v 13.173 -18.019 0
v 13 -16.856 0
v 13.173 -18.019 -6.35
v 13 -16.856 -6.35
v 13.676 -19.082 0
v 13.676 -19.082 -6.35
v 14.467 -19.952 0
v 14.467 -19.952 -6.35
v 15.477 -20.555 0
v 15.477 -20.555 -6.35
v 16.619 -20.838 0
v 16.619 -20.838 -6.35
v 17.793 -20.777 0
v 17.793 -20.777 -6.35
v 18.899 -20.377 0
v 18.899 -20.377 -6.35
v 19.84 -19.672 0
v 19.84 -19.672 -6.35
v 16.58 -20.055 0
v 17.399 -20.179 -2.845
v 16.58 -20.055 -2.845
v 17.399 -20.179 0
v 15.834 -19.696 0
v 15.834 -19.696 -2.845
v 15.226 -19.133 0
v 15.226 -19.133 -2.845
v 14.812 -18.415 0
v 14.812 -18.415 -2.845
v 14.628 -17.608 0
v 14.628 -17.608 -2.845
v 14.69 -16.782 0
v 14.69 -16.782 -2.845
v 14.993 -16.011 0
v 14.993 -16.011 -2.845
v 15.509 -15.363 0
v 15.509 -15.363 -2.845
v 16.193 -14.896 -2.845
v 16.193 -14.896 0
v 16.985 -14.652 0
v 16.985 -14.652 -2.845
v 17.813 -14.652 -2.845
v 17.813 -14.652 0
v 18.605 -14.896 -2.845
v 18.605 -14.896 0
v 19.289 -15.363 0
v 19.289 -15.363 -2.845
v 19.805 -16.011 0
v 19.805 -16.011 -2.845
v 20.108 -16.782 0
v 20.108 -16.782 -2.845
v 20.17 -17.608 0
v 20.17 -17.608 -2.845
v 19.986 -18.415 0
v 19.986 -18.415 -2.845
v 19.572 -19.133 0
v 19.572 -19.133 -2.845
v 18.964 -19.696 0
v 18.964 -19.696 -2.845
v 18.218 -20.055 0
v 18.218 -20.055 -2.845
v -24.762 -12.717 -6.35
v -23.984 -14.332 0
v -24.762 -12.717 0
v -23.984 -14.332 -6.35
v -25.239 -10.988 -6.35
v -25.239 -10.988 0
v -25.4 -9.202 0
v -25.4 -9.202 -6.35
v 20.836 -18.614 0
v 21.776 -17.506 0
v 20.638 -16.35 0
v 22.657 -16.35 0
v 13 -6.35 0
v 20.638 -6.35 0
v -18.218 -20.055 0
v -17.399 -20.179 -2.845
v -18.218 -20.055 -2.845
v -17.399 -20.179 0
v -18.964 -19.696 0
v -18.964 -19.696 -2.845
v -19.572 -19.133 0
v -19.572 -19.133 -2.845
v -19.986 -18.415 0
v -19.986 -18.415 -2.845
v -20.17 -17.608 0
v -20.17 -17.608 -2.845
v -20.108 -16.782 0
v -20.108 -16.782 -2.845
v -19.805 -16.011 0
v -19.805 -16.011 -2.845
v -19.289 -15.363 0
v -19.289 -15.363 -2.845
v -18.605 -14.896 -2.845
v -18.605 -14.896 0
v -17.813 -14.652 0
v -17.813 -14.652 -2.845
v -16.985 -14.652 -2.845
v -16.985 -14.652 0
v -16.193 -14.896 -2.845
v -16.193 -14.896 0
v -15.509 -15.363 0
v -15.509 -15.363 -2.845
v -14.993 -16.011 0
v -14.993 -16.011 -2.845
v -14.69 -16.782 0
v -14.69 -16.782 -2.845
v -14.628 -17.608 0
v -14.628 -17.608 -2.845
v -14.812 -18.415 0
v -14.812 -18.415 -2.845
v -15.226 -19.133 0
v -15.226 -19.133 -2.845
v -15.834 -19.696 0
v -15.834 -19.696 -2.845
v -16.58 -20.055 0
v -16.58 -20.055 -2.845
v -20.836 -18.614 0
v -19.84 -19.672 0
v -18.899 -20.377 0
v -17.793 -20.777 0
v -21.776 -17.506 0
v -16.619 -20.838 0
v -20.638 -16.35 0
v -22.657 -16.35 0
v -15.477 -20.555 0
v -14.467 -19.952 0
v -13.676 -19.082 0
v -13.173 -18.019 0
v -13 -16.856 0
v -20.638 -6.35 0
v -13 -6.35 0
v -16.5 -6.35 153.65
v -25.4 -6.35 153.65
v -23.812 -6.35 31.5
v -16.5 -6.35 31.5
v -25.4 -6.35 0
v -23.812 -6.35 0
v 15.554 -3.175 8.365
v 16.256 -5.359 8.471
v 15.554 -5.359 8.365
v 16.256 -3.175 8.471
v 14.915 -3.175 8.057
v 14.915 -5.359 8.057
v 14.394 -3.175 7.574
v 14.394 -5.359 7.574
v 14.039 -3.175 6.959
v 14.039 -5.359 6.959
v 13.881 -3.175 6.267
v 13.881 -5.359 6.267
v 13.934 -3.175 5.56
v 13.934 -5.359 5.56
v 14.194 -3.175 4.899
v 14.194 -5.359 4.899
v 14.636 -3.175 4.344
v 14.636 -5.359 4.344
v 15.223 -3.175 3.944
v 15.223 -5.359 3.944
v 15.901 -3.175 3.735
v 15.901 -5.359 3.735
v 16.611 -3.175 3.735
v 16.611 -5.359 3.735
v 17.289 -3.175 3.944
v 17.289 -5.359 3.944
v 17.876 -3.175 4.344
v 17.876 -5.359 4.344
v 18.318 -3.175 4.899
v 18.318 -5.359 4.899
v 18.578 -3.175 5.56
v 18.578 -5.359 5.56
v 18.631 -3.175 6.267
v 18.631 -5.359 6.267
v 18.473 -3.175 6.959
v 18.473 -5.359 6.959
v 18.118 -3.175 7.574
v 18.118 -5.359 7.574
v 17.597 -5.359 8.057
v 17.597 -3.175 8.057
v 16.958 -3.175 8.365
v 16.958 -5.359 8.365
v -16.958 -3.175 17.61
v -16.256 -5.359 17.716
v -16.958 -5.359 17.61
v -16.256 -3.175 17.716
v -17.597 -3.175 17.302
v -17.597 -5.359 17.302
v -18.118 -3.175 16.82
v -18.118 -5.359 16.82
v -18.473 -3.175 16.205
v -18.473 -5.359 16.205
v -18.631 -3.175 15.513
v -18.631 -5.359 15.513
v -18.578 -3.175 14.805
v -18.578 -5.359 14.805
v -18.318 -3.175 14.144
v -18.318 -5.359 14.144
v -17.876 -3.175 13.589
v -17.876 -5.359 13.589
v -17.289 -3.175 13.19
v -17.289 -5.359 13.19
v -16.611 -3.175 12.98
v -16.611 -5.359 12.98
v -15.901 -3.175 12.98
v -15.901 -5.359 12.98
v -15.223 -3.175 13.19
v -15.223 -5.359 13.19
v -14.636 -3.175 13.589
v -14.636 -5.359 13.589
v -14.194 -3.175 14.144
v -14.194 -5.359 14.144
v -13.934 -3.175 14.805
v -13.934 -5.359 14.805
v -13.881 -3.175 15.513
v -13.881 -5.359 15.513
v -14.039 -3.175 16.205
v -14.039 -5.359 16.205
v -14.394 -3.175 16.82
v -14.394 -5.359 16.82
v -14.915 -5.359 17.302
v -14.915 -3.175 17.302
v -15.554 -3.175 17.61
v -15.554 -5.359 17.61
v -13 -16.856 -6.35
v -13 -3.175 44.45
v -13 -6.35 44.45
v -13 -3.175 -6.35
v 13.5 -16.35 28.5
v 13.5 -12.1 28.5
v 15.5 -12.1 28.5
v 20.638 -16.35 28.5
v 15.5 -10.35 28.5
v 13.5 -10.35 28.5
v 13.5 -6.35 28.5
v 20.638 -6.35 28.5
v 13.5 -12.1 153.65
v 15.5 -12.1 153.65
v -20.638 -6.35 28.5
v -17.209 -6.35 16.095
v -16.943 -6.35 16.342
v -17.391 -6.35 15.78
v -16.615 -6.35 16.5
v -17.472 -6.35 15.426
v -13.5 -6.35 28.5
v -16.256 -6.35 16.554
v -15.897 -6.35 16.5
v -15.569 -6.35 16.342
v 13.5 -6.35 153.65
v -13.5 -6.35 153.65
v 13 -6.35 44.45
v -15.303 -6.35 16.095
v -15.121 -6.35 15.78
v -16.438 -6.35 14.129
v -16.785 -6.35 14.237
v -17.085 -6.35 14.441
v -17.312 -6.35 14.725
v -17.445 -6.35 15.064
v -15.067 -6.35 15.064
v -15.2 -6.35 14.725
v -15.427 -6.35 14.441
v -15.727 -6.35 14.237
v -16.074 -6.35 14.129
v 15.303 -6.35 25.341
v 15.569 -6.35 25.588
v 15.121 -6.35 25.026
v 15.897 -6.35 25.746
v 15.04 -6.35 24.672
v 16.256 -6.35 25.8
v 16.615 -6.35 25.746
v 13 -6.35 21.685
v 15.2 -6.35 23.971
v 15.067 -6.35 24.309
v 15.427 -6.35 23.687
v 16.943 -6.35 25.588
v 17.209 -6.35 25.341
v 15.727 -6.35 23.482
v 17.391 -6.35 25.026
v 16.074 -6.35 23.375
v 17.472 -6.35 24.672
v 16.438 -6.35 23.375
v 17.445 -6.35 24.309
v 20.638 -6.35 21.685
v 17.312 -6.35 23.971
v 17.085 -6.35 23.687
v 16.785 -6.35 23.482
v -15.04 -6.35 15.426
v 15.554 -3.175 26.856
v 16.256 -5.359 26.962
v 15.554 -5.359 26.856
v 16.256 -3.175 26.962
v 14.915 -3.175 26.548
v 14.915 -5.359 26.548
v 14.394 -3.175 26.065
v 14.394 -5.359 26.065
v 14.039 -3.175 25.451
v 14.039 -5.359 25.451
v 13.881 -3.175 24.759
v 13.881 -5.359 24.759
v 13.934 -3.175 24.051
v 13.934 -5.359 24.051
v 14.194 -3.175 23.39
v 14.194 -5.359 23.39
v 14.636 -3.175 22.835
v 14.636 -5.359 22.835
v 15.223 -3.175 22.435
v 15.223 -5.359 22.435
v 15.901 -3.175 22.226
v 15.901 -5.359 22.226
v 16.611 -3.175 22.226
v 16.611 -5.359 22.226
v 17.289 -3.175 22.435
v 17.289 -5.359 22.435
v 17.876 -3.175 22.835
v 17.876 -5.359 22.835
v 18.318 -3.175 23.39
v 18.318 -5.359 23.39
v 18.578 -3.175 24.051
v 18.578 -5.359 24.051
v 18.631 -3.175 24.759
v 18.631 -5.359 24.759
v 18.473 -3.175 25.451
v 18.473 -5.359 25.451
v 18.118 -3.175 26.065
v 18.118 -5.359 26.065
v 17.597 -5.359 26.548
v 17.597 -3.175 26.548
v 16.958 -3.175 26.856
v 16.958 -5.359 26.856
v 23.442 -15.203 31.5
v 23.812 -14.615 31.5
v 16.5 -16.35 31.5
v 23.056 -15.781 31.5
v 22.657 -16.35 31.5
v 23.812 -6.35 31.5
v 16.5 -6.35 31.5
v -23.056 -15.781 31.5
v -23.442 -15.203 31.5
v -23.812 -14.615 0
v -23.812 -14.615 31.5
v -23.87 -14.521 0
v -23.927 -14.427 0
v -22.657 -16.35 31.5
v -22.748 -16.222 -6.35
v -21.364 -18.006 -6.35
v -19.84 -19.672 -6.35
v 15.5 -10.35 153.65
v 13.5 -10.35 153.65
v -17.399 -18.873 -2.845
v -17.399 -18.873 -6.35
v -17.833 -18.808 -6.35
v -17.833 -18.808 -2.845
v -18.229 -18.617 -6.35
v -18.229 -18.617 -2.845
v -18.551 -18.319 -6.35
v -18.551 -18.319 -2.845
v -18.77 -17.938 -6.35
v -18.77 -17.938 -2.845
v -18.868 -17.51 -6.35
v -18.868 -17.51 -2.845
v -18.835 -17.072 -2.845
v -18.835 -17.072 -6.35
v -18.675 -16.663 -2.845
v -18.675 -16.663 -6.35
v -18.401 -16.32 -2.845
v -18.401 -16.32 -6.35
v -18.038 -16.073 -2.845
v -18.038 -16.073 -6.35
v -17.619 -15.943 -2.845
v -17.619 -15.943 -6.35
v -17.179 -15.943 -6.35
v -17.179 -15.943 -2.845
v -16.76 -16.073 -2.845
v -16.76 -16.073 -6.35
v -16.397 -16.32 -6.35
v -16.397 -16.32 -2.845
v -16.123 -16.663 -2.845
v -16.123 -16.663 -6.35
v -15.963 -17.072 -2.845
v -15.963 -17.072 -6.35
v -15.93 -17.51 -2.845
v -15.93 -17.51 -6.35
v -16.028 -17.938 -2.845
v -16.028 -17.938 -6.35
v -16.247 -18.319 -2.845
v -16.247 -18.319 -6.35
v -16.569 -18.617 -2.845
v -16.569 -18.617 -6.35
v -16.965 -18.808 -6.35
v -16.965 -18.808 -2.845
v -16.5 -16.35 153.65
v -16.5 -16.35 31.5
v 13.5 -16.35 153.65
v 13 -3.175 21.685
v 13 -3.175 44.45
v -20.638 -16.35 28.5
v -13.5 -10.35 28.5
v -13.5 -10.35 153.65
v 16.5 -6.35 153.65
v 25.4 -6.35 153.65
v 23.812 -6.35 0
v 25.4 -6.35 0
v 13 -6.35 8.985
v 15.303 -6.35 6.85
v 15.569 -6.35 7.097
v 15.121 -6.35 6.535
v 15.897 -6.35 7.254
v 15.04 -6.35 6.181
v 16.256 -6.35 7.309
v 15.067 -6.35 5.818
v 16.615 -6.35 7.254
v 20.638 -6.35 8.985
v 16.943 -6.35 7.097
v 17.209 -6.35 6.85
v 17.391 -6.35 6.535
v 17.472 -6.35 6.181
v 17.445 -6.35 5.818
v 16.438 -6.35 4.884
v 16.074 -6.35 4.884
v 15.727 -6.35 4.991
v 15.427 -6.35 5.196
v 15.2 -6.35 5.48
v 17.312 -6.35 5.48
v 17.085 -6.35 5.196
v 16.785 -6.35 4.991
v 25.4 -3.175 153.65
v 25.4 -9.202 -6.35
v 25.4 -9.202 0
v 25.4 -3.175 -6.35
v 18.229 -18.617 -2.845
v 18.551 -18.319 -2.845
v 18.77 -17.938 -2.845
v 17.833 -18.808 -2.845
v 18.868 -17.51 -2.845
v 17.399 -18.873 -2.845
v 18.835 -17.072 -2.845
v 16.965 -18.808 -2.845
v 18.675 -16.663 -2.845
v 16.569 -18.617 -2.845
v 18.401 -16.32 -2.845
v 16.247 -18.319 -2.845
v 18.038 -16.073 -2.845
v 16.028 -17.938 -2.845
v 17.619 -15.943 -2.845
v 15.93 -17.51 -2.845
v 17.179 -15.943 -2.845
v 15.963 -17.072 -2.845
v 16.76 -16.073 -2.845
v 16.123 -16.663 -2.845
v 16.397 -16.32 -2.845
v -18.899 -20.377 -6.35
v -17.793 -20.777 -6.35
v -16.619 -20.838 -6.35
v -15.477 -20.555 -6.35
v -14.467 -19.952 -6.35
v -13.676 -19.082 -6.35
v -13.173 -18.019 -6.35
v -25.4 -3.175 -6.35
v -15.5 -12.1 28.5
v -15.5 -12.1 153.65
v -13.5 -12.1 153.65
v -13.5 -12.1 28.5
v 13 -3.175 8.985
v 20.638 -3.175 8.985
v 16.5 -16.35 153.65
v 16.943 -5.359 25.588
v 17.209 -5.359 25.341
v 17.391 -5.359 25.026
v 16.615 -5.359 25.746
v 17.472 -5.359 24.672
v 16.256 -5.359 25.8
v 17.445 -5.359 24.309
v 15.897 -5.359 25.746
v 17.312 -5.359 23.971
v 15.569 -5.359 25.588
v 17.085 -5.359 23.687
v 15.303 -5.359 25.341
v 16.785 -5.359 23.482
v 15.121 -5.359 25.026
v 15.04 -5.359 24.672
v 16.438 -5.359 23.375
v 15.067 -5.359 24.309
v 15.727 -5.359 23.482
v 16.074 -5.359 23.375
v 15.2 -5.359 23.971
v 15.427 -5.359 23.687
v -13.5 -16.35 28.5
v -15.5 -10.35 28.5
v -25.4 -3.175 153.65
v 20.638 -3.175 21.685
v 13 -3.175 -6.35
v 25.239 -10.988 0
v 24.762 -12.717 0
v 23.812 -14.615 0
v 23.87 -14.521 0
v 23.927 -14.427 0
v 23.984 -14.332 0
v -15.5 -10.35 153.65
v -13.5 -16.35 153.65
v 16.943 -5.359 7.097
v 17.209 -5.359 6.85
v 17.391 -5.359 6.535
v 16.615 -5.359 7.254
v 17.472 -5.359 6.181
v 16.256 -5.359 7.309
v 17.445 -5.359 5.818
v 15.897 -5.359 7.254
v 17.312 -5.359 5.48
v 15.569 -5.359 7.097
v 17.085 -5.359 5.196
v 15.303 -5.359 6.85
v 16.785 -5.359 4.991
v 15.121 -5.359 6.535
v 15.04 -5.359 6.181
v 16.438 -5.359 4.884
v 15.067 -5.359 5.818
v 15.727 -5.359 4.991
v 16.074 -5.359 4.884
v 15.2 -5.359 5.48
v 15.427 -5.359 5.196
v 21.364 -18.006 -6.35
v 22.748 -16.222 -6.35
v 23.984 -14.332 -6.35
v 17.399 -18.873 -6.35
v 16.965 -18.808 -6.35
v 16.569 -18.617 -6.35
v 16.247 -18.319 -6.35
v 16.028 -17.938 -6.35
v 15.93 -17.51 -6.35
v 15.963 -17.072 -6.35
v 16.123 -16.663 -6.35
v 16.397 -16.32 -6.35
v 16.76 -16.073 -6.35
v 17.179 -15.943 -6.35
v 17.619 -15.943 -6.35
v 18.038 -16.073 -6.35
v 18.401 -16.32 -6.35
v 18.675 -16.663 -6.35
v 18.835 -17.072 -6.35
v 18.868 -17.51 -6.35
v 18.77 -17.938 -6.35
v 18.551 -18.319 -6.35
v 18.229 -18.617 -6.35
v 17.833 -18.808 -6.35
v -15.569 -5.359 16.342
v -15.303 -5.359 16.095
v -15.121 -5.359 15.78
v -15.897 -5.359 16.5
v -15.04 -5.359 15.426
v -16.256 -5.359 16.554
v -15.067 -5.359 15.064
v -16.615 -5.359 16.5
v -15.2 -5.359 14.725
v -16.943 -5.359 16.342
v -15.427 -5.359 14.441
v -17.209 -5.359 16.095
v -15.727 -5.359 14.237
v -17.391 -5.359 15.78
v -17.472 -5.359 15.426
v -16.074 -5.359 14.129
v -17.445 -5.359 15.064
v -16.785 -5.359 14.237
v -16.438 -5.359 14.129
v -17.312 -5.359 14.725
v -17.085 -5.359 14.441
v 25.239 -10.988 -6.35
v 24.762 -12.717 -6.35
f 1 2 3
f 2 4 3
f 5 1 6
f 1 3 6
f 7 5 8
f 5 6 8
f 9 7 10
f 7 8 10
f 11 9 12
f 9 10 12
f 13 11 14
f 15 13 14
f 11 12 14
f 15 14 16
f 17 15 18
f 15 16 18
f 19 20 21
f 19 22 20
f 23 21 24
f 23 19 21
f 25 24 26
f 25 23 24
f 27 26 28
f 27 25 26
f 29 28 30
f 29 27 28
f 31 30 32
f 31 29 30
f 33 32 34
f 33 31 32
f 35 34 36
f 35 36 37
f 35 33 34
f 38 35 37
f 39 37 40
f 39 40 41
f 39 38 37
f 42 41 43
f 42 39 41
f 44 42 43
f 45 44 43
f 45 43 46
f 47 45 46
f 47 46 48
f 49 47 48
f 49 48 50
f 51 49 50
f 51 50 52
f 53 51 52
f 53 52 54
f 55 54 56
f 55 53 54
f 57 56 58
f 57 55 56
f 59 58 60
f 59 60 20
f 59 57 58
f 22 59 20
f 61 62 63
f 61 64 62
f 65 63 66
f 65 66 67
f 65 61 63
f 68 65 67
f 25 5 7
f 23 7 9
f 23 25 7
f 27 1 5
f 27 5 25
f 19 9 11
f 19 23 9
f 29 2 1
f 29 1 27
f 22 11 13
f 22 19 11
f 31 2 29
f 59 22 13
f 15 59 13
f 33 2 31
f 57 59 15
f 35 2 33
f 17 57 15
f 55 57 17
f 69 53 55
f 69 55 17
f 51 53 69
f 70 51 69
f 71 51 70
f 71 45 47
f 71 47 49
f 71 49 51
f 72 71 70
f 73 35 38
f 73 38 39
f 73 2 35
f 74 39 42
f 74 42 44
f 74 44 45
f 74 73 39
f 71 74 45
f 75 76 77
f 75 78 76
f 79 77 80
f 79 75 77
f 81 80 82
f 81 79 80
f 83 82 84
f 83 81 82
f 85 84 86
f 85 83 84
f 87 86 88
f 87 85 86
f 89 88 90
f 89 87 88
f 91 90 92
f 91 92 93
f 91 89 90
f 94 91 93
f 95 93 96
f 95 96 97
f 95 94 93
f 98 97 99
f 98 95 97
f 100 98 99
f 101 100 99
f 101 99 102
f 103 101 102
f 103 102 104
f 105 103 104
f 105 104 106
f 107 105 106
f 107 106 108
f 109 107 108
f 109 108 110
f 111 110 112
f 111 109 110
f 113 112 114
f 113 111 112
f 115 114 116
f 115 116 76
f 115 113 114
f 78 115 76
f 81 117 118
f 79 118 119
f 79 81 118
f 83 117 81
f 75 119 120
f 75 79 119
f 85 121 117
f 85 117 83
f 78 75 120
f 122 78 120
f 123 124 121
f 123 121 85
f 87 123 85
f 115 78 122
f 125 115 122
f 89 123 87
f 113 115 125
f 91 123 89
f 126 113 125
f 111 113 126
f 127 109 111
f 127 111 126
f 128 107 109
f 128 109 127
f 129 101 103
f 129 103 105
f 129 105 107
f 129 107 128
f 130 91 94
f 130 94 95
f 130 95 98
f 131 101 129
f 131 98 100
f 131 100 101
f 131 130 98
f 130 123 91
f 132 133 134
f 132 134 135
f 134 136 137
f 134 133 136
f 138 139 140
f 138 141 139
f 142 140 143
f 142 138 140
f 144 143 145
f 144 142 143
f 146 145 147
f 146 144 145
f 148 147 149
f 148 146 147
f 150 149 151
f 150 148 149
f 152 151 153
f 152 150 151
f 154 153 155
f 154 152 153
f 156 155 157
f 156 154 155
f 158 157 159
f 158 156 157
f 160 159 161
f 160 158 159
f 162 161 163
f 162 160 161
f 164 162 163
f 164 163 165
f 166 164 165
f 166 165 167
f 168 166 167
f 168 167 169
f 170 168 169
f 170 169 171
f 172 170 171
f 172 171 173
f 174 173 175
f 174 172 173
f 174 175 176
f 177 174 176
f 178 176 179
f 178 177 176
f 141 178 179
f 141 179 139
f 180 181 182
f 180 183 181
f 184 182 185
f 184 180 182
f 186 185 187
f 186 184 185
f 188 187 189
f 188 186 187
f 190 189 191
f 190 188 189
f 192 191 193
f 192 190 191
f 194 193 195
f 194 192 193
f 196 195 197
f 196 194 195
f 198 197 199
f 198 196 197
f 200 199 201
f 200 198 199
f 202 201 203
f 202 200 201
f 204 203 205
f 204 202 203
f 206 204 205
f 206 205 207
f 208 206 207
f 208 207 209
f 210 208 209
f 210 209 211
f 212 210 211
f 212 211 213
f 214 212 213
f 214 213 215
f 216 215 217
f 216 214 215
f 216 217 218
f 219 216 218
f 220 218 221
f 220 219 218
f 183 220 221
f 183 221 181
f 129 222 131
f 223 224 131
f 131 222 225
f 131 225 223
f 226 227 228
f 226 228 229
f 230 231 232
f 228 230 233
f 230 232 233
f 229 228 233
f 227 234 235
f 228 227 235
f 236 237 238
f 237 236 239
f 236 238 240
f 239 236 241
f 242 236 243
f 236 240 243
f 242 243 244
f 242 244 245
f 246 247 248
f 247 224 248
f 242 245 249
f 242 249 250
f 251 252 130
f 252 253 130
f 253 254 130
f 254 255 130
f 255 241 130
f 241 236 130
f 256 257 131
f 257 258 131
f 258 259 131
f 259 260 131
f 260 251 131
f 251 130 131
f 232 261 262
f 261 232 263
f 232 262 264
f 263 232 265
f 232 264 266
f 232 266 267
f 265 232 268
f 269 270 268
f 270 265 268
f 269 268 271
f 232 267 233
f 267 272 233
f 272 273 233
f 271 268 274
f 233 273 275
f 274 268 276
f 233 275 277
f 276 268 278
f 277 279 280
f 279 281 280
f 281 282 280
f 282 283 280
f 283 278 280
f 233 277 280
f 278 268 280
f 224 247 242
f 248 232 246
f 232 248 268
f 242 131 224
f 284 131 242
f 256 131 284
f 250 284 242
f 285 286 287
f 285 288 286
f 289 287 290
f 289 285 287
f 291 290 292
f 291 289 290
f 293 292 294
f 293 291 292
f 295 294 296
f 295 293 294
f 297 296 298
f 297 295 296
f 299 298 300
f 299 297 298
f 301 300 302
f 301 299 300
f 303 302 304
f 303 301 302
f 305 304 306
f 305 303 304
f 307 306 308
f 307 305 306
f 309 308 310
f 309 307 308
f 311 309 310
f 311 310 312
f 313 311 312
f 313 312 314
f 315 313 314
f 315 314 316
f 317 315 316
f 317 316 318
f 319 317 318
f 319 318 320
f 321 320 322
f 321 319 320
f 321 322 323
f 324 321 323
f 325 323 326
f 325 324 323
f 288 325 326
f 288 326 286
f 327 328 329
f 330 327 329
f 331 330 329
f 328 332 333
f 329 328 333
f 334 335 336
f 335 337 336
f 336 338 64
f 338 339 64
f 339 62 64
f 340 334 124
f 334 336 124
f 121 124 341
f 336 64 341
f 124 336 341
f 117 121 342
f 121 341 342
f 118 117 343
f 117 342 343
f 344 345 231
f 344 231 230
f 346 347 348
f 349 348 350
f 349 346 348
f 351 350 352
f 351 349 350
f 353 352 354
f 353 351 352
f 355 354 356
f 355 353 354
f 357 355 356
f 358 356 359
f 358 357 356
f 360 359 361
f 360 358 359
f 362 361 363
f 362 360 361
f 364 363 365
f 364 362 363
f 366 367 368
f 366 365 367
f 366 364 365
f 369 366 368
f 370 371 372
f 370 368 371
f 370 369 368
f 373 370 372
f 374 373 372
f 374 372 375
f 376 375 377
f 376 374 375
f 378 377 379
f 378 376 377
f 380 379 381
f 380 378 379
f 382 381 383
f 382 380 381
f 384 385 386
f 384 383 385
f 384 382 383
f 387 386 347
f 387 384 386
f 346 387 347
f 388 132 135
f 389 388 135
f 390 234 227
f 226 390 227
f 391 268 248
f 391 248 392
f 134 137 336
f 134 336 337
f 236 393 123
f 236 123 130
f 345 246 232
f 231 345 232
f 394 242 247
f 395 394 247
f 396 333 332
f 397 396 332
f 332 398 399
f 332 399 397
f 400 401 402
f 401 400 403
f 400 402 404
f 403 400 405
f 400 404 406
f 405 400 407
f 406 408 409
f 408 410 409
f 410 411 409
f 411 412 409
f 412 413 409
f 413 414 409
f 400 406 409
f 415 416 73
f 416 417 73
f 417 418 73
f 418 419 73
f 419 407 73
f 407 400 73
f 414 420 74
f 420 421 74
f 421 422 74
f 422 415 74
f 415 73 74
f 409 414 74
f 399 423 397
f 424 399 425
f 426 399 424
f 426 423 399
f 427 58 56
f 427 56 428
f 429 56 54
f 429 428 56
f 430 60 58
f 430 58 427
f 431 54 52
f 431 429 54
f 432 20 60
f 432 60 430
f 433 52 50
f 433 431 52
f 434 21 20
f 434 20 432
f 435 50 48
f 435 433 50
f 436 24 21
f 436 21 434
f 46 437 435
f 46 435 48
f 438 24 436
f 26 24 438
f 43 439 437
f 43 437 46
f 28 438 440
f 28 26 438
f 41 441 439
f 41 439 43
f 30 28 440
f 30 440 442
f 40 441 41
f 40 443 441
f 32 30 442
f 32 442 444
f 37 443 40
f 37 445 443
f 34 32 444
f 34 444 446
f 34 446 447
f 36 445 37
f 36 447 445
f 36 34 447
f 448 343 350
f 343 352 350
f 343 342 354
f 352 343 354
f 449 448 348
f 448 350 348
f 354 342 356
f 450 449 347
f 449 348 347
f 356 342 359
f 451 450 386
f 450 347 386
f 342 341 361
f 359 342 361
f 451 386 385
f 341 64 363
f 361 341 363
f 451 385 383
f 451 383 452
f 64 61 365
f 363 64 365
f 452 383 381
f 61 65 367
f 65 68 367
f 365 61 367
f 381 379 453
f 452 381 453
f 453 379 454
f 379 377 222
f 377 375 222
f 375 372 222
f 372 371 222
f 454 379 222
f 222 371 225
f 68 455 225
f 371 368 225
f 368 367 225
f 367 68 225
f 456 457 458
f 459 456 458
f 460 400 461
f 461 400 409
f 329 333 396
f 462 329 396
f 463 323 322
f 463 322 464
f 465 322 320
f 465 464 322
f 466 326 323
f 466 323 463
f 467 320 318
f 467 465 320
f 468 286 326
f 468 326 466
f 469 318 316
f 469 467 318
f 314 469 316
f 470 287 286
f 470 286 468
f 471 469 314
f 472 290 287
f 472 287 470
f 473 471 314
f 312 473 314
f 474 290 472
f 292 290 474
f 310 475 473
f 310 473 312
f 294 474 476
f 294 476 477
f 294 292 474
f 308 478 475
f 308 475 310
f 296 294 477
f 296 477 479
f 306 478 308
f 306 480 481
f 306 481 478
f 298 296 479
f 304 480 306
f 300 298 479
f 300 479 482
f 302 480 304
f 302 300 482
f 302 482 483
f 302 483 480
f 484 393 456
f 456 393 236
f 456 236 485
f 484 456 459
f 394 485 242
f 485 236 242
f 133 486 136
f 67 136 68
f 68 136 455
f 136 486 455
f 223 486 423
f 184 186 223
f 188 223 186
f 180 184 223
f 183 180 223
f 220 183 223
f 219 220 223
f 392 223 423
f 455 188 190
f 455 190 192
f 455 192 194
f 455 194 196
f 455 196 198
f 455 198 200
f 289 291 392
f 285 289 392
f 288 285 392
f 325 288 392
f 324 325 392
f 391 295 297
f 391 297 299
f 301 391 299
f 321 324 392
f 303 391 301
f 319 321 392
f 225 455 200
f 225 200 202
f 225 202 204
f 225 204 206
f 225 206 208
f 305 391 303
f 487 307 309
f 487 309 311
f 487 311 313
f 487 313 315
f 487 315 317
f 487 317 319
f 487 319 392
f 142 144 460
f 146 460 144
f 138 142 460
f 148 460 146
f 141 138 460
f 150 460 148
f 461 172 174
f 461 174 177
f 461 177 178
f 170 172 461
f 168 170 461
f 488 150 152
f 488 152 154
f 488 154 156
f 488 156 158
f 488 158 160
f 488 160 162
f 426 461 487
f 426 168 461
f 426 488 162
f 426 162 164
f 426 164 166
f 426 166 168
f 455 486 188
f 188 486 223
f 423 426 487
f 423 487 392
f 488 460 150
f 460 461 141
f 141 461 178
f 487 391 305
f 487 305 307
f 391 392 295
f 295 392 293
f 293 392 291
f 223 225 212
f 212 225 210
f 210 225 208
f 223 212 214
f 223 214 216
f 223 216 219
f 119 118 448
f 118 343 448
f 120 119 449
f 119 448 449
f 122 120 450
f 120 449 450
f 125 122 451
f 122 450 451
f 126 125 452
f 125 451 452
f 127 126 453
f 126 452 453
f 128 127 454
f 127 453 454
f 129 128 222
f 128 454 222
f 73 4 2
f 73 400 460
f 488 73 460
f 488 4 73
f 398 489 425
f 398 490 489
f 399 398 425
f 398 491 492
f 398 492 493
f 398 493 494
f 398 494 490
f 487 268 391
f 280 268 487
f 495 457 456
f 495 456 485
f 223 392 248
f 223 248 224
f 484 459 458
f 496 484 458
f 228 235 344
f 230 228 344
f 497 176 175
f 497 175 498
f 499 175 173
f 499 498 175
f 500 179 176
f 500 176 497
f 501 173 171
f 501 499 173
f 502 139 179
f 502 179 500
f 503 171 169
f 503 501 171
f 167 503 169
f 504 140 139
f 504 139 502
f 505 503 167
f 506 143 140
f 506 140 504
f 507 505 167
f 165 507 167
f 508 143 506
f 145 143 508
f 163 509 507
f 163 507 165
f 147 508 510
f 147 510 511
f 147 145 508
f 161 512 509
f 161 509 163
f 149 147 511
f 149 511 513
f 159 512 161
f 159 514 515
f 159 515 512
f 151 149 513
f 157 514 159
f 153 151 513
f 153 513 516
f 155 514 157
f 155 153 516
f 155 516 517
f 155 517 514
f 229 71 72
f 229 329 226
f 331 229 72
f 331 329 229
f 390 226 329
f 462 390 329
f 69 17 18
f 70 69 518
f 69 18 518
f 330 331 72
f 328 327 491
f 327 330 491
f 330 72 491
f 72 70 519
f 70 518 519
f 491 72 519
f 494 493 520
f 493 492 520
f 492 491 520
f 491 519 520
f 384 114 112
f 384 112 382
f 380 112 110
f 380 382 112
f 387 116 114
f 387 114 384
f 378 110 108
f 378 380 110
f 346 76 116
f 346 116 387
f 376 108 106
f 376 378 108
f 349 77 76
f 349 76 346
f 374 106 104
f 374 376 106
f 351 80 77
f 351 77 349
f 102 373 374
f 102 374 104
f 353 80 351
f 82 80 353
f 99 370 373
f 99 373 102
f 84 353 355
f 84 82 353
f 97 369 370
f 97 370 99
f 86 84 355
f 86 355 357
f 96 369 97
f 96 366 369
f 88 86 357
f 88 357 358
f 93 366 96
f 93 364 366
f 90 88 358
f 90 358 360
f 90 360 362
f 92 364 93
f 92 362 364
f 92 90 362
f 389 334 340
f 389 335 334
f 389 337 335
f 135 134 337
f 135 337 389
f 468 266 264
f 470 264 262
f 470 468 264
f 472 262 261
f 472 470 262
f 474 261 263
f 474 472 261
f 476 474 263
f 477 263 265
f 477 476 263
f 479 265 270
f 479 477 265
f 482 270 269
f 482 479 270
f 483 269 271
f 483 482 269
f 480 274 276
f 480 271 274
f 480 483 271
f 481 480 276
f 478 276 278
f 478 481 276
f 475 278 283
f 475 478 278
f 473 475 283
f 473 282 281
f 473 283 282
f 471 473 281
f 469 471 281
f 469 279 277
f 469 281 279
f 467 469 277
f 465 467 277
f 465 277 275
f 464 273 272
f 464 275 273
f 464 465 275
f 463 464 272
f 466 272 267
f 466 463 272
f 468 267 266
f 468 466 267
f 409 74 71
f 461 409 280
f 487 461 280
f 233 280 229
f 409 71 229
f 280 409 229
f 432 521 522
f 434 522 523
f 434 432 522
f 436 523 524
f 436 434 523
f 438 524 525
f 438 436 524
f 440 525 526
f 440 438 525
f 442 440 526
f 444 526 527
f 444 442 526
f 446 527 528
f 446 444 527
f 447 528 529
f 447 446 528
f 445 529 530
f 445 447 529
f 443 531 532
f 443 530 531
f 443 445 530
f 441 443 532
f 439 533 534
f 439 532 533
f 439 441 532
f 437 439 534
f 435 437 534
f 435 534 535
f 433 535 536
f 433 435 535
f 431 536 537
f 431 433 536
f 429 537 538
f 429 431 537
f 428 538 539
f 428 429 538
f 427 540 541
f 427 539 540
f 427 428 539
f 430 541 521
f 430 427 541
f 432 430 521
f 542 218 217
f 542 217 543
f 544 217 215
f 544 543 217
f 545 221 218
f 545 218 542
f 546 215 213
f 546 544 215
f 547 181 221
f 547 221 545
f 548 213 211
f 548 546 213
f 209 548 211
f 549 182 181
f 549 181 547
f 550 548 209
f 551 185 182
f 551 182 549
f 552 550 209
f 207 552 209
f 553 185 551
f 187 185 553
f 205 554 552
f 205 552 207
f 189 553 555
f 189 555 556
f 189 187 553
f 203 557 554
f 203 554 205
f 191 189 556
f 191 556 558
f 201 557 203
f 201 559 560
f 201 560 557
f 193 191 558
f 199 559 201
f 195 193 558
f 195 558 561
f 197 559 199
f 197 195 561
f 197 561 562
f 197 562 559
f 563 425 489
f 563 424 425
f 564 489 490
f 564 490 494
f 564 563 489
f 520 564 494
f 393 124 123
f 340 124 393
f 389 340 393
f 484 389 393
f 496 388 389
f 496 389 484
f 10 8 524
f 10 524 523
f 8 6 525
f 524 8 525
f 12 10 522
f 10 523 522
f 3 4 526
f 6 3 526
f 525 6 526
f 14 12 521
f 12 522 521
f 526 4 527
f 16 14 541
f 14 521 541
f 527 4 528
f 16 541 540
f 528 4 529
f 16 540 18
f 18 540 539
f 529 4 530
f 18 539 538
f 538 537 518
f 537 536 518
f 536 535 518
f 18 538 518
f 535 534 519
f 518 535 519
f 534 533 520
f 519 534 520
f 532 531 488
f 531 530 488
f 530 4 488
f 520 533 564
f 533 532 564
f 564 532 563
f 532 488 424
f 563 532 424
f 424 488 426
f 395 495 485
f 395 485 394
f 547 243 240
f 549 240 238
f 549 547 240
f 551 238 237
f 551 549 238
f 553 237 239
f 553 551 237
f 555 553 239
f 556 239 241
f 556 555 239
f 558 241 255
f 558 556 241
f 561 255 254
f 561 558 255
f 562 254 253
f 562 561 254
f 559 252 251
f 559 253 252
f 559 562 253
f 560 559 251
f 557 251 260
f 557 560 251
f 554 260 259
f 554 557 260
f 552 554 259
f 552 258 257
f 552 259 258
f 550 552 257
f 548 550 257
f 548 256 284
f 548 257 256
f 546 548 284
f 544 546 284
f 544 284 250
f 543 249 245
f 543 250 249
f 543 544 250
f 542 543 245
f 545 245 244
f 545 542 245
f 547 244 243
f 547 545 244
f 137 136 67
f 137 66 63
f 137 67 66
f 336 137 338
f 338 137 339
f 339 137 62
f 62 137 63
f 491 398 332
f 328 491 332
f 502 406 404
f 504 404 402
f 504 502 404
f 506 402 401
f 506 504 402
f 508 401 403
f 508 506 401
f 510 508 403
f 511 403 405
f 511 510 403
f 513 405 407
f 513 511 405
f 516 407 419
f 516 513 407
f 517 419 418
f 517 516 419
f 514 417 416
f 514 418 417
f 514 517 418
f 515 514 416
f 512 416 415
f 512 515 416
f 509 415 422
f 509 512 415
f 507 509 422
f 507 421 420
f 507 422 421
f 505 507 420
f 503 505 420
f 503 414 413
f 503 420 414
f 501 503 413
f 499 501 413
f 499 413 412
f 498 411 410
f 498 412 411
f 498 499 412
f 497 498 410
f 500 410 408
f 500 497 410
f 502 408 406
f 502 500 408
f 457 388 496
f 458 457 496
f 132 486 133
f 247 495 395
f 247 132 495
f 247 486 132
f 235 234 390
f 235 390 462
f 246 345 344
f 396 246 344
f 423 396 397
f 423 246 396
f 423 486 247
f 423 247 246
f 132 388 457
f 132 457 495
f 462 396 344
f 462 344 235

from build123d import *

# Parameters (mm, degrees)
SKETCH1_W                                     = 50.8
SKETCH1_H                                     = 25.4
BASE_FLANGE1_DEPTH                            = 6.35
SKETCH22_W                                    = 50.8
SKETCH22_H                                    = 160
BOSS_EXTRUDE1_DEPTH                           = 3.175
GUSSET1_START                                 = -22.225
GUSSET1_DEPTH                                 = 1.5875
CBORE_FOR_4_SOCKET_HEAD_CAP_SCREW1_AT_2_COUNT = 2
CBORE_FOR_4_SOCKET_HEAD_CAP_SCREW1_AT_2_PITCH = 34.798
SKETCH12_W                                    = 26
SKETCH12_H                                    = 28.575
CUT_EXTRUDE1_DEPTH                            = 50.8
SKETCH13_W                                    = 33.6375
SKETCH13_H                                    = 12.7
CUT_EXTRUDE2_DEPTH                            = 50.8
CBORE_FOR_2_SOCKET_HEAD_CAP_SCREW1_AT_2_COUNT = 2
CBORE_FOR_2_SOCKET_HEAD_CAP_SCREW1_AT_2_PITCH = 33.801054175
CBORE_FOR_2_SOCKET_HEAD_CAP_SCREW1_AT_3_COUNT = 2
CBORE_FOR_2_SOCKET_HEAD_CAP_SCREW1_AT_3_PITCH = 33.801054175
EXTRUDE_THIN1_DEPTH                           = 10
SKETCH25_W                                    = 3.175
SKETCH25_H                                    = 31.5
EXTRUDE_THIN2_DEPTH                           = 10
SKETCH17_OUTSIDE_W                            = 86.756
SKETCH17_OUTSIDE_H                            = 61.356
SKETCH17_OUTSIDE_R                            = 27.94
CUT_EXTRUDE3_DEPTH                            = 165.504378741
FILLET1_R                                     = 10
FILLET2_R                                     = 4
SKETCH24_W                                    = 31
SKETCH24_H                                    = 1.75
CUT_EXTRUDE4_DEPTH                            = 125.15


# Read off the part's stored shape, not the designer's step: Gusset1
# Sheet-metal steps are written as plain solids
with BuildPart() as part:
    # Sketch1 → Base-Flange1 (new body)
    with BuildSketch(Plane.XY):
        with Locations((0, -15.875)):
            Rectangle(SKETCH1_W, SKETCH1_H)
    extrude(amount=-BASE_FLANGE1_DEPTH)

    # Sketch22 → Boss-Extrude1 (add)
    with BuildSketch(Plane(origin=(0, -3.175, 0), x_dir=(1, 0, 0), z_dir=(0, 1, 0))):
        with Locations((0, -73.65)):
            Rectangle(SKETCH22_W, SKETCH22_H)
    extrude(amount=-BOSS_EXTRUDE1_DEPTH)

    # Sketch11 → CBORE for #4 Socket Head Cap Screw1 (revolve, cut)
    with BuildSketch(Plane(origin=(-17.399, -17.4, 0), x_dir=(0, -1, 0), z_dir=(1, 0, 0))):
        Polygon((0, 0), (0, 6.351), (1.4732, 6.351), (1.4732, 2.8448), (2.77876, 2.8448), (2.77876, 0), align=None)
    cbore_for_4_socket_head_cap_screw1 = revolve(axis=Axis((-17.399, -17.4, 6.35), (0, 0, -1)), mode=Mode.SUBTRACT)

    # CBORE for #4 Socket Head Cap Screw1 at 2: CBORE for #4 Socket Head Cap Screw1 ×2
    with Locations(*[(i * CBORE_FOR_4_SOCKET_HEAD_CAP_SCREW1_AT_2_PITCH, 0, 0) for i in range(1, CBORE_FOR_4_SOCKET_HEAD_CAP_SCREW1_AT_2_COUNT)]):
        add(cbore_for_4_socket_head_cap_screw1, mode=Mode.SUBTRACT)

    # Sketch12 → Cut-Extrude1 (cut)
    with BuildSketch(Plane(origin=(0, 0, -6.35), x_dir=(-1, 0, 0), z_dir=(0, 0, -1))):
        with Locations((0, -14.2875)):
            Rectangle(SKETCH12_W, SKETCH12_H)
    extrude(amount=-CUT_EXTRUDE1_DEPTH, mode=Mode.SUBTRACT)


with BuildPart() as body_2:
    # Gusset1 outline → Gusset1 (new body)
    with BuildSketch(Plane.YZ.offset(GUSSET1_START)):
        Polygon((-16.35, 5), (-16.35, 0), (-6.35, 0), (-6.35, 30), (-10.35, 30), align=None)
    gusset1 = extrude(amount=GUSSET1_DEPTH)


with BuildPart() as part_1:
    add(part.part)

    # Mirror2: Gusset1 across plane
    add(gusset1.mirror(Plane(origin=(0, 0, 0), x_dir=(0, 0, 1), z_dir=(1, 0, 0))))

    # Sketch13 → Cut-Extrude2 (cut)
    with BuildSketch(Plane.XZ.offset(6.35)):
        with Locations((3.81875, 15.335)):
            Rectangle(SKETCH13_W, SKETCH13_H)
    extrude(amount=-CUT_EXTRUDE2_DEPTH, mode=Mode.SUBTRACT)

    # Sketch16 → CBORE for #2 Socket Head Cap Screw1 (revolve, cut)
    with BuildSketch(Plane(origin=(-16.256, -3.175, 15.335), x_dir=(0, 0, 1), z_dir=(1, 0, 0))):
        Polygon((0, 0), (0, 17.242569267), (1.2192, 16.51), (1.2192, 2.1844), (2.38125, 2.1844), (2.38125, 0), align=None)
    cbore_for_2_socket_head_cap_screw1 = revolve(axis=Axis((-16.256, 3.175, 15.335), (0, -1, 0)), mode=Mode.SUBTRACT)

    # CBORE for #2 Socket Head Cap Screw1 at 2: CBORE for #2 Socket Head Cap Screw1 ×2
    with Locations(*[Vector(0.9618634919315714, 0, 0.27352993051804053) * (i * CBORE_FOR_2_SOCKET_HEAD_CAP_SCREW1_AT_2_PITCH) for i in range(1, CBORE_FOR_2_SOCKET_HEAD_CAP_SCREW1_AT_2_COUNT)]):
        add(cbore_for_2_socket_head_cap_screw1, mode=Mode.SUBTRACT)

    # CBORE for #2 Socket Head Cap Screw1 at 3: CBORE for #2 Socket Head Cap Screw1 ×2
    with Locations(*[Vector(0.9618634919315714, 0, -0.2735299305180405) * (i * CBORE_FOR_2_SOCKET_HEAD_CAP_SCREW1_AT_3_PITCH) for i in range(1, CBORE_FOR_2_SOCKET_HEAD_CAP_SCREW1_AT_3_COUNT)]):
        add(cbore_for_2_socket_head_cap_screw1, mode=Mode.SUBTRACT)

    add(body_2.part)  # Extrude-Thin1 merges body 2
    # Sketch23 → Extrude-Thin1 (add)
    with BuildSketch(Plane.XZ.offset(6.35)):
        Polygon((-22.225, 28.5), (-13.5, 28.5), (-13.5, 153.65), (-16.5, 153.65), (-16.5, 31.5), (-22.225, 31.5), align=None)
        Polygon((13.5, 153.65), (13.5, 28.5), (22.225, 28.5), (22.225, 31.5), (16.5, 31.5), (16.5, 153.65), align=None)
    extrude(amount=EXTRUDE_THIN1_DEPTH)

    # Sketch25 → Extrude-Thin2 (add)
    with BuildSketch(Plane.XZ.offset(6.35)):
        with Locations((-22.225, 15.75)):
            Rectangle(SKETCH25_W, SKETCH25_H)
        with Locations((22.225, 15.75)):
            Rectangle(SKETCH25_W, SKETCH25_H)
    extrude(amount=EXTRUDE_THIN2_DEPTH)

    # Sketch17 outside → Cut-Extrude3 (cut, through all)
    with BuildSketch(Plane(origin=(0, 0, -6.35), x_dir=(-1, 0, 0), z_dir=(0, 0, -1))):
        with Locations((0, -15.875)):
            Rectangle(SKETCH17_OUTSIDE_W, SKETCH17_OUTSIDE_H)
        Circle(SKETCH17_OUTSIDE_R, mode=Mode.SUBTRACT)
    extrude(amount=-CUT_EXTRUDE3_DEPTH, mode=Mode.SUBTRACT)

    # Fillet1
    fillet1_edges = [part_1.edges().sort_by_distance(p)[0] for p in [
        (-25.4, -11.639742265, -3.175),
        (25.4, -11.639742265, -3.175),
    ]]
    fillet(fillet1_edges, radius=FILLET1_R)

    # Fillet2
    fillet2_edges = [part_1.edges().sort_by_distance(p)[0] for p in [
        (-13, -24.731429397, -3.175),
        (13, -24.731429397, -3.175),
    ]]
    fillet(fillet2_edges, radius=FILLET2_R)

    # Sketch24 → Cut-Extrude4 (cut)
    with BuildSketch(Plane.XY.offset(153.65)):
        with Locations((0, -11.225)):
            Rectangle(SKETCH24_W, SKETCH24_H)
    extrude(amount=-CUT_EXTRUDE4_DEPTH, mode=Mode.SUBTRACT)


solid = part_1.part
